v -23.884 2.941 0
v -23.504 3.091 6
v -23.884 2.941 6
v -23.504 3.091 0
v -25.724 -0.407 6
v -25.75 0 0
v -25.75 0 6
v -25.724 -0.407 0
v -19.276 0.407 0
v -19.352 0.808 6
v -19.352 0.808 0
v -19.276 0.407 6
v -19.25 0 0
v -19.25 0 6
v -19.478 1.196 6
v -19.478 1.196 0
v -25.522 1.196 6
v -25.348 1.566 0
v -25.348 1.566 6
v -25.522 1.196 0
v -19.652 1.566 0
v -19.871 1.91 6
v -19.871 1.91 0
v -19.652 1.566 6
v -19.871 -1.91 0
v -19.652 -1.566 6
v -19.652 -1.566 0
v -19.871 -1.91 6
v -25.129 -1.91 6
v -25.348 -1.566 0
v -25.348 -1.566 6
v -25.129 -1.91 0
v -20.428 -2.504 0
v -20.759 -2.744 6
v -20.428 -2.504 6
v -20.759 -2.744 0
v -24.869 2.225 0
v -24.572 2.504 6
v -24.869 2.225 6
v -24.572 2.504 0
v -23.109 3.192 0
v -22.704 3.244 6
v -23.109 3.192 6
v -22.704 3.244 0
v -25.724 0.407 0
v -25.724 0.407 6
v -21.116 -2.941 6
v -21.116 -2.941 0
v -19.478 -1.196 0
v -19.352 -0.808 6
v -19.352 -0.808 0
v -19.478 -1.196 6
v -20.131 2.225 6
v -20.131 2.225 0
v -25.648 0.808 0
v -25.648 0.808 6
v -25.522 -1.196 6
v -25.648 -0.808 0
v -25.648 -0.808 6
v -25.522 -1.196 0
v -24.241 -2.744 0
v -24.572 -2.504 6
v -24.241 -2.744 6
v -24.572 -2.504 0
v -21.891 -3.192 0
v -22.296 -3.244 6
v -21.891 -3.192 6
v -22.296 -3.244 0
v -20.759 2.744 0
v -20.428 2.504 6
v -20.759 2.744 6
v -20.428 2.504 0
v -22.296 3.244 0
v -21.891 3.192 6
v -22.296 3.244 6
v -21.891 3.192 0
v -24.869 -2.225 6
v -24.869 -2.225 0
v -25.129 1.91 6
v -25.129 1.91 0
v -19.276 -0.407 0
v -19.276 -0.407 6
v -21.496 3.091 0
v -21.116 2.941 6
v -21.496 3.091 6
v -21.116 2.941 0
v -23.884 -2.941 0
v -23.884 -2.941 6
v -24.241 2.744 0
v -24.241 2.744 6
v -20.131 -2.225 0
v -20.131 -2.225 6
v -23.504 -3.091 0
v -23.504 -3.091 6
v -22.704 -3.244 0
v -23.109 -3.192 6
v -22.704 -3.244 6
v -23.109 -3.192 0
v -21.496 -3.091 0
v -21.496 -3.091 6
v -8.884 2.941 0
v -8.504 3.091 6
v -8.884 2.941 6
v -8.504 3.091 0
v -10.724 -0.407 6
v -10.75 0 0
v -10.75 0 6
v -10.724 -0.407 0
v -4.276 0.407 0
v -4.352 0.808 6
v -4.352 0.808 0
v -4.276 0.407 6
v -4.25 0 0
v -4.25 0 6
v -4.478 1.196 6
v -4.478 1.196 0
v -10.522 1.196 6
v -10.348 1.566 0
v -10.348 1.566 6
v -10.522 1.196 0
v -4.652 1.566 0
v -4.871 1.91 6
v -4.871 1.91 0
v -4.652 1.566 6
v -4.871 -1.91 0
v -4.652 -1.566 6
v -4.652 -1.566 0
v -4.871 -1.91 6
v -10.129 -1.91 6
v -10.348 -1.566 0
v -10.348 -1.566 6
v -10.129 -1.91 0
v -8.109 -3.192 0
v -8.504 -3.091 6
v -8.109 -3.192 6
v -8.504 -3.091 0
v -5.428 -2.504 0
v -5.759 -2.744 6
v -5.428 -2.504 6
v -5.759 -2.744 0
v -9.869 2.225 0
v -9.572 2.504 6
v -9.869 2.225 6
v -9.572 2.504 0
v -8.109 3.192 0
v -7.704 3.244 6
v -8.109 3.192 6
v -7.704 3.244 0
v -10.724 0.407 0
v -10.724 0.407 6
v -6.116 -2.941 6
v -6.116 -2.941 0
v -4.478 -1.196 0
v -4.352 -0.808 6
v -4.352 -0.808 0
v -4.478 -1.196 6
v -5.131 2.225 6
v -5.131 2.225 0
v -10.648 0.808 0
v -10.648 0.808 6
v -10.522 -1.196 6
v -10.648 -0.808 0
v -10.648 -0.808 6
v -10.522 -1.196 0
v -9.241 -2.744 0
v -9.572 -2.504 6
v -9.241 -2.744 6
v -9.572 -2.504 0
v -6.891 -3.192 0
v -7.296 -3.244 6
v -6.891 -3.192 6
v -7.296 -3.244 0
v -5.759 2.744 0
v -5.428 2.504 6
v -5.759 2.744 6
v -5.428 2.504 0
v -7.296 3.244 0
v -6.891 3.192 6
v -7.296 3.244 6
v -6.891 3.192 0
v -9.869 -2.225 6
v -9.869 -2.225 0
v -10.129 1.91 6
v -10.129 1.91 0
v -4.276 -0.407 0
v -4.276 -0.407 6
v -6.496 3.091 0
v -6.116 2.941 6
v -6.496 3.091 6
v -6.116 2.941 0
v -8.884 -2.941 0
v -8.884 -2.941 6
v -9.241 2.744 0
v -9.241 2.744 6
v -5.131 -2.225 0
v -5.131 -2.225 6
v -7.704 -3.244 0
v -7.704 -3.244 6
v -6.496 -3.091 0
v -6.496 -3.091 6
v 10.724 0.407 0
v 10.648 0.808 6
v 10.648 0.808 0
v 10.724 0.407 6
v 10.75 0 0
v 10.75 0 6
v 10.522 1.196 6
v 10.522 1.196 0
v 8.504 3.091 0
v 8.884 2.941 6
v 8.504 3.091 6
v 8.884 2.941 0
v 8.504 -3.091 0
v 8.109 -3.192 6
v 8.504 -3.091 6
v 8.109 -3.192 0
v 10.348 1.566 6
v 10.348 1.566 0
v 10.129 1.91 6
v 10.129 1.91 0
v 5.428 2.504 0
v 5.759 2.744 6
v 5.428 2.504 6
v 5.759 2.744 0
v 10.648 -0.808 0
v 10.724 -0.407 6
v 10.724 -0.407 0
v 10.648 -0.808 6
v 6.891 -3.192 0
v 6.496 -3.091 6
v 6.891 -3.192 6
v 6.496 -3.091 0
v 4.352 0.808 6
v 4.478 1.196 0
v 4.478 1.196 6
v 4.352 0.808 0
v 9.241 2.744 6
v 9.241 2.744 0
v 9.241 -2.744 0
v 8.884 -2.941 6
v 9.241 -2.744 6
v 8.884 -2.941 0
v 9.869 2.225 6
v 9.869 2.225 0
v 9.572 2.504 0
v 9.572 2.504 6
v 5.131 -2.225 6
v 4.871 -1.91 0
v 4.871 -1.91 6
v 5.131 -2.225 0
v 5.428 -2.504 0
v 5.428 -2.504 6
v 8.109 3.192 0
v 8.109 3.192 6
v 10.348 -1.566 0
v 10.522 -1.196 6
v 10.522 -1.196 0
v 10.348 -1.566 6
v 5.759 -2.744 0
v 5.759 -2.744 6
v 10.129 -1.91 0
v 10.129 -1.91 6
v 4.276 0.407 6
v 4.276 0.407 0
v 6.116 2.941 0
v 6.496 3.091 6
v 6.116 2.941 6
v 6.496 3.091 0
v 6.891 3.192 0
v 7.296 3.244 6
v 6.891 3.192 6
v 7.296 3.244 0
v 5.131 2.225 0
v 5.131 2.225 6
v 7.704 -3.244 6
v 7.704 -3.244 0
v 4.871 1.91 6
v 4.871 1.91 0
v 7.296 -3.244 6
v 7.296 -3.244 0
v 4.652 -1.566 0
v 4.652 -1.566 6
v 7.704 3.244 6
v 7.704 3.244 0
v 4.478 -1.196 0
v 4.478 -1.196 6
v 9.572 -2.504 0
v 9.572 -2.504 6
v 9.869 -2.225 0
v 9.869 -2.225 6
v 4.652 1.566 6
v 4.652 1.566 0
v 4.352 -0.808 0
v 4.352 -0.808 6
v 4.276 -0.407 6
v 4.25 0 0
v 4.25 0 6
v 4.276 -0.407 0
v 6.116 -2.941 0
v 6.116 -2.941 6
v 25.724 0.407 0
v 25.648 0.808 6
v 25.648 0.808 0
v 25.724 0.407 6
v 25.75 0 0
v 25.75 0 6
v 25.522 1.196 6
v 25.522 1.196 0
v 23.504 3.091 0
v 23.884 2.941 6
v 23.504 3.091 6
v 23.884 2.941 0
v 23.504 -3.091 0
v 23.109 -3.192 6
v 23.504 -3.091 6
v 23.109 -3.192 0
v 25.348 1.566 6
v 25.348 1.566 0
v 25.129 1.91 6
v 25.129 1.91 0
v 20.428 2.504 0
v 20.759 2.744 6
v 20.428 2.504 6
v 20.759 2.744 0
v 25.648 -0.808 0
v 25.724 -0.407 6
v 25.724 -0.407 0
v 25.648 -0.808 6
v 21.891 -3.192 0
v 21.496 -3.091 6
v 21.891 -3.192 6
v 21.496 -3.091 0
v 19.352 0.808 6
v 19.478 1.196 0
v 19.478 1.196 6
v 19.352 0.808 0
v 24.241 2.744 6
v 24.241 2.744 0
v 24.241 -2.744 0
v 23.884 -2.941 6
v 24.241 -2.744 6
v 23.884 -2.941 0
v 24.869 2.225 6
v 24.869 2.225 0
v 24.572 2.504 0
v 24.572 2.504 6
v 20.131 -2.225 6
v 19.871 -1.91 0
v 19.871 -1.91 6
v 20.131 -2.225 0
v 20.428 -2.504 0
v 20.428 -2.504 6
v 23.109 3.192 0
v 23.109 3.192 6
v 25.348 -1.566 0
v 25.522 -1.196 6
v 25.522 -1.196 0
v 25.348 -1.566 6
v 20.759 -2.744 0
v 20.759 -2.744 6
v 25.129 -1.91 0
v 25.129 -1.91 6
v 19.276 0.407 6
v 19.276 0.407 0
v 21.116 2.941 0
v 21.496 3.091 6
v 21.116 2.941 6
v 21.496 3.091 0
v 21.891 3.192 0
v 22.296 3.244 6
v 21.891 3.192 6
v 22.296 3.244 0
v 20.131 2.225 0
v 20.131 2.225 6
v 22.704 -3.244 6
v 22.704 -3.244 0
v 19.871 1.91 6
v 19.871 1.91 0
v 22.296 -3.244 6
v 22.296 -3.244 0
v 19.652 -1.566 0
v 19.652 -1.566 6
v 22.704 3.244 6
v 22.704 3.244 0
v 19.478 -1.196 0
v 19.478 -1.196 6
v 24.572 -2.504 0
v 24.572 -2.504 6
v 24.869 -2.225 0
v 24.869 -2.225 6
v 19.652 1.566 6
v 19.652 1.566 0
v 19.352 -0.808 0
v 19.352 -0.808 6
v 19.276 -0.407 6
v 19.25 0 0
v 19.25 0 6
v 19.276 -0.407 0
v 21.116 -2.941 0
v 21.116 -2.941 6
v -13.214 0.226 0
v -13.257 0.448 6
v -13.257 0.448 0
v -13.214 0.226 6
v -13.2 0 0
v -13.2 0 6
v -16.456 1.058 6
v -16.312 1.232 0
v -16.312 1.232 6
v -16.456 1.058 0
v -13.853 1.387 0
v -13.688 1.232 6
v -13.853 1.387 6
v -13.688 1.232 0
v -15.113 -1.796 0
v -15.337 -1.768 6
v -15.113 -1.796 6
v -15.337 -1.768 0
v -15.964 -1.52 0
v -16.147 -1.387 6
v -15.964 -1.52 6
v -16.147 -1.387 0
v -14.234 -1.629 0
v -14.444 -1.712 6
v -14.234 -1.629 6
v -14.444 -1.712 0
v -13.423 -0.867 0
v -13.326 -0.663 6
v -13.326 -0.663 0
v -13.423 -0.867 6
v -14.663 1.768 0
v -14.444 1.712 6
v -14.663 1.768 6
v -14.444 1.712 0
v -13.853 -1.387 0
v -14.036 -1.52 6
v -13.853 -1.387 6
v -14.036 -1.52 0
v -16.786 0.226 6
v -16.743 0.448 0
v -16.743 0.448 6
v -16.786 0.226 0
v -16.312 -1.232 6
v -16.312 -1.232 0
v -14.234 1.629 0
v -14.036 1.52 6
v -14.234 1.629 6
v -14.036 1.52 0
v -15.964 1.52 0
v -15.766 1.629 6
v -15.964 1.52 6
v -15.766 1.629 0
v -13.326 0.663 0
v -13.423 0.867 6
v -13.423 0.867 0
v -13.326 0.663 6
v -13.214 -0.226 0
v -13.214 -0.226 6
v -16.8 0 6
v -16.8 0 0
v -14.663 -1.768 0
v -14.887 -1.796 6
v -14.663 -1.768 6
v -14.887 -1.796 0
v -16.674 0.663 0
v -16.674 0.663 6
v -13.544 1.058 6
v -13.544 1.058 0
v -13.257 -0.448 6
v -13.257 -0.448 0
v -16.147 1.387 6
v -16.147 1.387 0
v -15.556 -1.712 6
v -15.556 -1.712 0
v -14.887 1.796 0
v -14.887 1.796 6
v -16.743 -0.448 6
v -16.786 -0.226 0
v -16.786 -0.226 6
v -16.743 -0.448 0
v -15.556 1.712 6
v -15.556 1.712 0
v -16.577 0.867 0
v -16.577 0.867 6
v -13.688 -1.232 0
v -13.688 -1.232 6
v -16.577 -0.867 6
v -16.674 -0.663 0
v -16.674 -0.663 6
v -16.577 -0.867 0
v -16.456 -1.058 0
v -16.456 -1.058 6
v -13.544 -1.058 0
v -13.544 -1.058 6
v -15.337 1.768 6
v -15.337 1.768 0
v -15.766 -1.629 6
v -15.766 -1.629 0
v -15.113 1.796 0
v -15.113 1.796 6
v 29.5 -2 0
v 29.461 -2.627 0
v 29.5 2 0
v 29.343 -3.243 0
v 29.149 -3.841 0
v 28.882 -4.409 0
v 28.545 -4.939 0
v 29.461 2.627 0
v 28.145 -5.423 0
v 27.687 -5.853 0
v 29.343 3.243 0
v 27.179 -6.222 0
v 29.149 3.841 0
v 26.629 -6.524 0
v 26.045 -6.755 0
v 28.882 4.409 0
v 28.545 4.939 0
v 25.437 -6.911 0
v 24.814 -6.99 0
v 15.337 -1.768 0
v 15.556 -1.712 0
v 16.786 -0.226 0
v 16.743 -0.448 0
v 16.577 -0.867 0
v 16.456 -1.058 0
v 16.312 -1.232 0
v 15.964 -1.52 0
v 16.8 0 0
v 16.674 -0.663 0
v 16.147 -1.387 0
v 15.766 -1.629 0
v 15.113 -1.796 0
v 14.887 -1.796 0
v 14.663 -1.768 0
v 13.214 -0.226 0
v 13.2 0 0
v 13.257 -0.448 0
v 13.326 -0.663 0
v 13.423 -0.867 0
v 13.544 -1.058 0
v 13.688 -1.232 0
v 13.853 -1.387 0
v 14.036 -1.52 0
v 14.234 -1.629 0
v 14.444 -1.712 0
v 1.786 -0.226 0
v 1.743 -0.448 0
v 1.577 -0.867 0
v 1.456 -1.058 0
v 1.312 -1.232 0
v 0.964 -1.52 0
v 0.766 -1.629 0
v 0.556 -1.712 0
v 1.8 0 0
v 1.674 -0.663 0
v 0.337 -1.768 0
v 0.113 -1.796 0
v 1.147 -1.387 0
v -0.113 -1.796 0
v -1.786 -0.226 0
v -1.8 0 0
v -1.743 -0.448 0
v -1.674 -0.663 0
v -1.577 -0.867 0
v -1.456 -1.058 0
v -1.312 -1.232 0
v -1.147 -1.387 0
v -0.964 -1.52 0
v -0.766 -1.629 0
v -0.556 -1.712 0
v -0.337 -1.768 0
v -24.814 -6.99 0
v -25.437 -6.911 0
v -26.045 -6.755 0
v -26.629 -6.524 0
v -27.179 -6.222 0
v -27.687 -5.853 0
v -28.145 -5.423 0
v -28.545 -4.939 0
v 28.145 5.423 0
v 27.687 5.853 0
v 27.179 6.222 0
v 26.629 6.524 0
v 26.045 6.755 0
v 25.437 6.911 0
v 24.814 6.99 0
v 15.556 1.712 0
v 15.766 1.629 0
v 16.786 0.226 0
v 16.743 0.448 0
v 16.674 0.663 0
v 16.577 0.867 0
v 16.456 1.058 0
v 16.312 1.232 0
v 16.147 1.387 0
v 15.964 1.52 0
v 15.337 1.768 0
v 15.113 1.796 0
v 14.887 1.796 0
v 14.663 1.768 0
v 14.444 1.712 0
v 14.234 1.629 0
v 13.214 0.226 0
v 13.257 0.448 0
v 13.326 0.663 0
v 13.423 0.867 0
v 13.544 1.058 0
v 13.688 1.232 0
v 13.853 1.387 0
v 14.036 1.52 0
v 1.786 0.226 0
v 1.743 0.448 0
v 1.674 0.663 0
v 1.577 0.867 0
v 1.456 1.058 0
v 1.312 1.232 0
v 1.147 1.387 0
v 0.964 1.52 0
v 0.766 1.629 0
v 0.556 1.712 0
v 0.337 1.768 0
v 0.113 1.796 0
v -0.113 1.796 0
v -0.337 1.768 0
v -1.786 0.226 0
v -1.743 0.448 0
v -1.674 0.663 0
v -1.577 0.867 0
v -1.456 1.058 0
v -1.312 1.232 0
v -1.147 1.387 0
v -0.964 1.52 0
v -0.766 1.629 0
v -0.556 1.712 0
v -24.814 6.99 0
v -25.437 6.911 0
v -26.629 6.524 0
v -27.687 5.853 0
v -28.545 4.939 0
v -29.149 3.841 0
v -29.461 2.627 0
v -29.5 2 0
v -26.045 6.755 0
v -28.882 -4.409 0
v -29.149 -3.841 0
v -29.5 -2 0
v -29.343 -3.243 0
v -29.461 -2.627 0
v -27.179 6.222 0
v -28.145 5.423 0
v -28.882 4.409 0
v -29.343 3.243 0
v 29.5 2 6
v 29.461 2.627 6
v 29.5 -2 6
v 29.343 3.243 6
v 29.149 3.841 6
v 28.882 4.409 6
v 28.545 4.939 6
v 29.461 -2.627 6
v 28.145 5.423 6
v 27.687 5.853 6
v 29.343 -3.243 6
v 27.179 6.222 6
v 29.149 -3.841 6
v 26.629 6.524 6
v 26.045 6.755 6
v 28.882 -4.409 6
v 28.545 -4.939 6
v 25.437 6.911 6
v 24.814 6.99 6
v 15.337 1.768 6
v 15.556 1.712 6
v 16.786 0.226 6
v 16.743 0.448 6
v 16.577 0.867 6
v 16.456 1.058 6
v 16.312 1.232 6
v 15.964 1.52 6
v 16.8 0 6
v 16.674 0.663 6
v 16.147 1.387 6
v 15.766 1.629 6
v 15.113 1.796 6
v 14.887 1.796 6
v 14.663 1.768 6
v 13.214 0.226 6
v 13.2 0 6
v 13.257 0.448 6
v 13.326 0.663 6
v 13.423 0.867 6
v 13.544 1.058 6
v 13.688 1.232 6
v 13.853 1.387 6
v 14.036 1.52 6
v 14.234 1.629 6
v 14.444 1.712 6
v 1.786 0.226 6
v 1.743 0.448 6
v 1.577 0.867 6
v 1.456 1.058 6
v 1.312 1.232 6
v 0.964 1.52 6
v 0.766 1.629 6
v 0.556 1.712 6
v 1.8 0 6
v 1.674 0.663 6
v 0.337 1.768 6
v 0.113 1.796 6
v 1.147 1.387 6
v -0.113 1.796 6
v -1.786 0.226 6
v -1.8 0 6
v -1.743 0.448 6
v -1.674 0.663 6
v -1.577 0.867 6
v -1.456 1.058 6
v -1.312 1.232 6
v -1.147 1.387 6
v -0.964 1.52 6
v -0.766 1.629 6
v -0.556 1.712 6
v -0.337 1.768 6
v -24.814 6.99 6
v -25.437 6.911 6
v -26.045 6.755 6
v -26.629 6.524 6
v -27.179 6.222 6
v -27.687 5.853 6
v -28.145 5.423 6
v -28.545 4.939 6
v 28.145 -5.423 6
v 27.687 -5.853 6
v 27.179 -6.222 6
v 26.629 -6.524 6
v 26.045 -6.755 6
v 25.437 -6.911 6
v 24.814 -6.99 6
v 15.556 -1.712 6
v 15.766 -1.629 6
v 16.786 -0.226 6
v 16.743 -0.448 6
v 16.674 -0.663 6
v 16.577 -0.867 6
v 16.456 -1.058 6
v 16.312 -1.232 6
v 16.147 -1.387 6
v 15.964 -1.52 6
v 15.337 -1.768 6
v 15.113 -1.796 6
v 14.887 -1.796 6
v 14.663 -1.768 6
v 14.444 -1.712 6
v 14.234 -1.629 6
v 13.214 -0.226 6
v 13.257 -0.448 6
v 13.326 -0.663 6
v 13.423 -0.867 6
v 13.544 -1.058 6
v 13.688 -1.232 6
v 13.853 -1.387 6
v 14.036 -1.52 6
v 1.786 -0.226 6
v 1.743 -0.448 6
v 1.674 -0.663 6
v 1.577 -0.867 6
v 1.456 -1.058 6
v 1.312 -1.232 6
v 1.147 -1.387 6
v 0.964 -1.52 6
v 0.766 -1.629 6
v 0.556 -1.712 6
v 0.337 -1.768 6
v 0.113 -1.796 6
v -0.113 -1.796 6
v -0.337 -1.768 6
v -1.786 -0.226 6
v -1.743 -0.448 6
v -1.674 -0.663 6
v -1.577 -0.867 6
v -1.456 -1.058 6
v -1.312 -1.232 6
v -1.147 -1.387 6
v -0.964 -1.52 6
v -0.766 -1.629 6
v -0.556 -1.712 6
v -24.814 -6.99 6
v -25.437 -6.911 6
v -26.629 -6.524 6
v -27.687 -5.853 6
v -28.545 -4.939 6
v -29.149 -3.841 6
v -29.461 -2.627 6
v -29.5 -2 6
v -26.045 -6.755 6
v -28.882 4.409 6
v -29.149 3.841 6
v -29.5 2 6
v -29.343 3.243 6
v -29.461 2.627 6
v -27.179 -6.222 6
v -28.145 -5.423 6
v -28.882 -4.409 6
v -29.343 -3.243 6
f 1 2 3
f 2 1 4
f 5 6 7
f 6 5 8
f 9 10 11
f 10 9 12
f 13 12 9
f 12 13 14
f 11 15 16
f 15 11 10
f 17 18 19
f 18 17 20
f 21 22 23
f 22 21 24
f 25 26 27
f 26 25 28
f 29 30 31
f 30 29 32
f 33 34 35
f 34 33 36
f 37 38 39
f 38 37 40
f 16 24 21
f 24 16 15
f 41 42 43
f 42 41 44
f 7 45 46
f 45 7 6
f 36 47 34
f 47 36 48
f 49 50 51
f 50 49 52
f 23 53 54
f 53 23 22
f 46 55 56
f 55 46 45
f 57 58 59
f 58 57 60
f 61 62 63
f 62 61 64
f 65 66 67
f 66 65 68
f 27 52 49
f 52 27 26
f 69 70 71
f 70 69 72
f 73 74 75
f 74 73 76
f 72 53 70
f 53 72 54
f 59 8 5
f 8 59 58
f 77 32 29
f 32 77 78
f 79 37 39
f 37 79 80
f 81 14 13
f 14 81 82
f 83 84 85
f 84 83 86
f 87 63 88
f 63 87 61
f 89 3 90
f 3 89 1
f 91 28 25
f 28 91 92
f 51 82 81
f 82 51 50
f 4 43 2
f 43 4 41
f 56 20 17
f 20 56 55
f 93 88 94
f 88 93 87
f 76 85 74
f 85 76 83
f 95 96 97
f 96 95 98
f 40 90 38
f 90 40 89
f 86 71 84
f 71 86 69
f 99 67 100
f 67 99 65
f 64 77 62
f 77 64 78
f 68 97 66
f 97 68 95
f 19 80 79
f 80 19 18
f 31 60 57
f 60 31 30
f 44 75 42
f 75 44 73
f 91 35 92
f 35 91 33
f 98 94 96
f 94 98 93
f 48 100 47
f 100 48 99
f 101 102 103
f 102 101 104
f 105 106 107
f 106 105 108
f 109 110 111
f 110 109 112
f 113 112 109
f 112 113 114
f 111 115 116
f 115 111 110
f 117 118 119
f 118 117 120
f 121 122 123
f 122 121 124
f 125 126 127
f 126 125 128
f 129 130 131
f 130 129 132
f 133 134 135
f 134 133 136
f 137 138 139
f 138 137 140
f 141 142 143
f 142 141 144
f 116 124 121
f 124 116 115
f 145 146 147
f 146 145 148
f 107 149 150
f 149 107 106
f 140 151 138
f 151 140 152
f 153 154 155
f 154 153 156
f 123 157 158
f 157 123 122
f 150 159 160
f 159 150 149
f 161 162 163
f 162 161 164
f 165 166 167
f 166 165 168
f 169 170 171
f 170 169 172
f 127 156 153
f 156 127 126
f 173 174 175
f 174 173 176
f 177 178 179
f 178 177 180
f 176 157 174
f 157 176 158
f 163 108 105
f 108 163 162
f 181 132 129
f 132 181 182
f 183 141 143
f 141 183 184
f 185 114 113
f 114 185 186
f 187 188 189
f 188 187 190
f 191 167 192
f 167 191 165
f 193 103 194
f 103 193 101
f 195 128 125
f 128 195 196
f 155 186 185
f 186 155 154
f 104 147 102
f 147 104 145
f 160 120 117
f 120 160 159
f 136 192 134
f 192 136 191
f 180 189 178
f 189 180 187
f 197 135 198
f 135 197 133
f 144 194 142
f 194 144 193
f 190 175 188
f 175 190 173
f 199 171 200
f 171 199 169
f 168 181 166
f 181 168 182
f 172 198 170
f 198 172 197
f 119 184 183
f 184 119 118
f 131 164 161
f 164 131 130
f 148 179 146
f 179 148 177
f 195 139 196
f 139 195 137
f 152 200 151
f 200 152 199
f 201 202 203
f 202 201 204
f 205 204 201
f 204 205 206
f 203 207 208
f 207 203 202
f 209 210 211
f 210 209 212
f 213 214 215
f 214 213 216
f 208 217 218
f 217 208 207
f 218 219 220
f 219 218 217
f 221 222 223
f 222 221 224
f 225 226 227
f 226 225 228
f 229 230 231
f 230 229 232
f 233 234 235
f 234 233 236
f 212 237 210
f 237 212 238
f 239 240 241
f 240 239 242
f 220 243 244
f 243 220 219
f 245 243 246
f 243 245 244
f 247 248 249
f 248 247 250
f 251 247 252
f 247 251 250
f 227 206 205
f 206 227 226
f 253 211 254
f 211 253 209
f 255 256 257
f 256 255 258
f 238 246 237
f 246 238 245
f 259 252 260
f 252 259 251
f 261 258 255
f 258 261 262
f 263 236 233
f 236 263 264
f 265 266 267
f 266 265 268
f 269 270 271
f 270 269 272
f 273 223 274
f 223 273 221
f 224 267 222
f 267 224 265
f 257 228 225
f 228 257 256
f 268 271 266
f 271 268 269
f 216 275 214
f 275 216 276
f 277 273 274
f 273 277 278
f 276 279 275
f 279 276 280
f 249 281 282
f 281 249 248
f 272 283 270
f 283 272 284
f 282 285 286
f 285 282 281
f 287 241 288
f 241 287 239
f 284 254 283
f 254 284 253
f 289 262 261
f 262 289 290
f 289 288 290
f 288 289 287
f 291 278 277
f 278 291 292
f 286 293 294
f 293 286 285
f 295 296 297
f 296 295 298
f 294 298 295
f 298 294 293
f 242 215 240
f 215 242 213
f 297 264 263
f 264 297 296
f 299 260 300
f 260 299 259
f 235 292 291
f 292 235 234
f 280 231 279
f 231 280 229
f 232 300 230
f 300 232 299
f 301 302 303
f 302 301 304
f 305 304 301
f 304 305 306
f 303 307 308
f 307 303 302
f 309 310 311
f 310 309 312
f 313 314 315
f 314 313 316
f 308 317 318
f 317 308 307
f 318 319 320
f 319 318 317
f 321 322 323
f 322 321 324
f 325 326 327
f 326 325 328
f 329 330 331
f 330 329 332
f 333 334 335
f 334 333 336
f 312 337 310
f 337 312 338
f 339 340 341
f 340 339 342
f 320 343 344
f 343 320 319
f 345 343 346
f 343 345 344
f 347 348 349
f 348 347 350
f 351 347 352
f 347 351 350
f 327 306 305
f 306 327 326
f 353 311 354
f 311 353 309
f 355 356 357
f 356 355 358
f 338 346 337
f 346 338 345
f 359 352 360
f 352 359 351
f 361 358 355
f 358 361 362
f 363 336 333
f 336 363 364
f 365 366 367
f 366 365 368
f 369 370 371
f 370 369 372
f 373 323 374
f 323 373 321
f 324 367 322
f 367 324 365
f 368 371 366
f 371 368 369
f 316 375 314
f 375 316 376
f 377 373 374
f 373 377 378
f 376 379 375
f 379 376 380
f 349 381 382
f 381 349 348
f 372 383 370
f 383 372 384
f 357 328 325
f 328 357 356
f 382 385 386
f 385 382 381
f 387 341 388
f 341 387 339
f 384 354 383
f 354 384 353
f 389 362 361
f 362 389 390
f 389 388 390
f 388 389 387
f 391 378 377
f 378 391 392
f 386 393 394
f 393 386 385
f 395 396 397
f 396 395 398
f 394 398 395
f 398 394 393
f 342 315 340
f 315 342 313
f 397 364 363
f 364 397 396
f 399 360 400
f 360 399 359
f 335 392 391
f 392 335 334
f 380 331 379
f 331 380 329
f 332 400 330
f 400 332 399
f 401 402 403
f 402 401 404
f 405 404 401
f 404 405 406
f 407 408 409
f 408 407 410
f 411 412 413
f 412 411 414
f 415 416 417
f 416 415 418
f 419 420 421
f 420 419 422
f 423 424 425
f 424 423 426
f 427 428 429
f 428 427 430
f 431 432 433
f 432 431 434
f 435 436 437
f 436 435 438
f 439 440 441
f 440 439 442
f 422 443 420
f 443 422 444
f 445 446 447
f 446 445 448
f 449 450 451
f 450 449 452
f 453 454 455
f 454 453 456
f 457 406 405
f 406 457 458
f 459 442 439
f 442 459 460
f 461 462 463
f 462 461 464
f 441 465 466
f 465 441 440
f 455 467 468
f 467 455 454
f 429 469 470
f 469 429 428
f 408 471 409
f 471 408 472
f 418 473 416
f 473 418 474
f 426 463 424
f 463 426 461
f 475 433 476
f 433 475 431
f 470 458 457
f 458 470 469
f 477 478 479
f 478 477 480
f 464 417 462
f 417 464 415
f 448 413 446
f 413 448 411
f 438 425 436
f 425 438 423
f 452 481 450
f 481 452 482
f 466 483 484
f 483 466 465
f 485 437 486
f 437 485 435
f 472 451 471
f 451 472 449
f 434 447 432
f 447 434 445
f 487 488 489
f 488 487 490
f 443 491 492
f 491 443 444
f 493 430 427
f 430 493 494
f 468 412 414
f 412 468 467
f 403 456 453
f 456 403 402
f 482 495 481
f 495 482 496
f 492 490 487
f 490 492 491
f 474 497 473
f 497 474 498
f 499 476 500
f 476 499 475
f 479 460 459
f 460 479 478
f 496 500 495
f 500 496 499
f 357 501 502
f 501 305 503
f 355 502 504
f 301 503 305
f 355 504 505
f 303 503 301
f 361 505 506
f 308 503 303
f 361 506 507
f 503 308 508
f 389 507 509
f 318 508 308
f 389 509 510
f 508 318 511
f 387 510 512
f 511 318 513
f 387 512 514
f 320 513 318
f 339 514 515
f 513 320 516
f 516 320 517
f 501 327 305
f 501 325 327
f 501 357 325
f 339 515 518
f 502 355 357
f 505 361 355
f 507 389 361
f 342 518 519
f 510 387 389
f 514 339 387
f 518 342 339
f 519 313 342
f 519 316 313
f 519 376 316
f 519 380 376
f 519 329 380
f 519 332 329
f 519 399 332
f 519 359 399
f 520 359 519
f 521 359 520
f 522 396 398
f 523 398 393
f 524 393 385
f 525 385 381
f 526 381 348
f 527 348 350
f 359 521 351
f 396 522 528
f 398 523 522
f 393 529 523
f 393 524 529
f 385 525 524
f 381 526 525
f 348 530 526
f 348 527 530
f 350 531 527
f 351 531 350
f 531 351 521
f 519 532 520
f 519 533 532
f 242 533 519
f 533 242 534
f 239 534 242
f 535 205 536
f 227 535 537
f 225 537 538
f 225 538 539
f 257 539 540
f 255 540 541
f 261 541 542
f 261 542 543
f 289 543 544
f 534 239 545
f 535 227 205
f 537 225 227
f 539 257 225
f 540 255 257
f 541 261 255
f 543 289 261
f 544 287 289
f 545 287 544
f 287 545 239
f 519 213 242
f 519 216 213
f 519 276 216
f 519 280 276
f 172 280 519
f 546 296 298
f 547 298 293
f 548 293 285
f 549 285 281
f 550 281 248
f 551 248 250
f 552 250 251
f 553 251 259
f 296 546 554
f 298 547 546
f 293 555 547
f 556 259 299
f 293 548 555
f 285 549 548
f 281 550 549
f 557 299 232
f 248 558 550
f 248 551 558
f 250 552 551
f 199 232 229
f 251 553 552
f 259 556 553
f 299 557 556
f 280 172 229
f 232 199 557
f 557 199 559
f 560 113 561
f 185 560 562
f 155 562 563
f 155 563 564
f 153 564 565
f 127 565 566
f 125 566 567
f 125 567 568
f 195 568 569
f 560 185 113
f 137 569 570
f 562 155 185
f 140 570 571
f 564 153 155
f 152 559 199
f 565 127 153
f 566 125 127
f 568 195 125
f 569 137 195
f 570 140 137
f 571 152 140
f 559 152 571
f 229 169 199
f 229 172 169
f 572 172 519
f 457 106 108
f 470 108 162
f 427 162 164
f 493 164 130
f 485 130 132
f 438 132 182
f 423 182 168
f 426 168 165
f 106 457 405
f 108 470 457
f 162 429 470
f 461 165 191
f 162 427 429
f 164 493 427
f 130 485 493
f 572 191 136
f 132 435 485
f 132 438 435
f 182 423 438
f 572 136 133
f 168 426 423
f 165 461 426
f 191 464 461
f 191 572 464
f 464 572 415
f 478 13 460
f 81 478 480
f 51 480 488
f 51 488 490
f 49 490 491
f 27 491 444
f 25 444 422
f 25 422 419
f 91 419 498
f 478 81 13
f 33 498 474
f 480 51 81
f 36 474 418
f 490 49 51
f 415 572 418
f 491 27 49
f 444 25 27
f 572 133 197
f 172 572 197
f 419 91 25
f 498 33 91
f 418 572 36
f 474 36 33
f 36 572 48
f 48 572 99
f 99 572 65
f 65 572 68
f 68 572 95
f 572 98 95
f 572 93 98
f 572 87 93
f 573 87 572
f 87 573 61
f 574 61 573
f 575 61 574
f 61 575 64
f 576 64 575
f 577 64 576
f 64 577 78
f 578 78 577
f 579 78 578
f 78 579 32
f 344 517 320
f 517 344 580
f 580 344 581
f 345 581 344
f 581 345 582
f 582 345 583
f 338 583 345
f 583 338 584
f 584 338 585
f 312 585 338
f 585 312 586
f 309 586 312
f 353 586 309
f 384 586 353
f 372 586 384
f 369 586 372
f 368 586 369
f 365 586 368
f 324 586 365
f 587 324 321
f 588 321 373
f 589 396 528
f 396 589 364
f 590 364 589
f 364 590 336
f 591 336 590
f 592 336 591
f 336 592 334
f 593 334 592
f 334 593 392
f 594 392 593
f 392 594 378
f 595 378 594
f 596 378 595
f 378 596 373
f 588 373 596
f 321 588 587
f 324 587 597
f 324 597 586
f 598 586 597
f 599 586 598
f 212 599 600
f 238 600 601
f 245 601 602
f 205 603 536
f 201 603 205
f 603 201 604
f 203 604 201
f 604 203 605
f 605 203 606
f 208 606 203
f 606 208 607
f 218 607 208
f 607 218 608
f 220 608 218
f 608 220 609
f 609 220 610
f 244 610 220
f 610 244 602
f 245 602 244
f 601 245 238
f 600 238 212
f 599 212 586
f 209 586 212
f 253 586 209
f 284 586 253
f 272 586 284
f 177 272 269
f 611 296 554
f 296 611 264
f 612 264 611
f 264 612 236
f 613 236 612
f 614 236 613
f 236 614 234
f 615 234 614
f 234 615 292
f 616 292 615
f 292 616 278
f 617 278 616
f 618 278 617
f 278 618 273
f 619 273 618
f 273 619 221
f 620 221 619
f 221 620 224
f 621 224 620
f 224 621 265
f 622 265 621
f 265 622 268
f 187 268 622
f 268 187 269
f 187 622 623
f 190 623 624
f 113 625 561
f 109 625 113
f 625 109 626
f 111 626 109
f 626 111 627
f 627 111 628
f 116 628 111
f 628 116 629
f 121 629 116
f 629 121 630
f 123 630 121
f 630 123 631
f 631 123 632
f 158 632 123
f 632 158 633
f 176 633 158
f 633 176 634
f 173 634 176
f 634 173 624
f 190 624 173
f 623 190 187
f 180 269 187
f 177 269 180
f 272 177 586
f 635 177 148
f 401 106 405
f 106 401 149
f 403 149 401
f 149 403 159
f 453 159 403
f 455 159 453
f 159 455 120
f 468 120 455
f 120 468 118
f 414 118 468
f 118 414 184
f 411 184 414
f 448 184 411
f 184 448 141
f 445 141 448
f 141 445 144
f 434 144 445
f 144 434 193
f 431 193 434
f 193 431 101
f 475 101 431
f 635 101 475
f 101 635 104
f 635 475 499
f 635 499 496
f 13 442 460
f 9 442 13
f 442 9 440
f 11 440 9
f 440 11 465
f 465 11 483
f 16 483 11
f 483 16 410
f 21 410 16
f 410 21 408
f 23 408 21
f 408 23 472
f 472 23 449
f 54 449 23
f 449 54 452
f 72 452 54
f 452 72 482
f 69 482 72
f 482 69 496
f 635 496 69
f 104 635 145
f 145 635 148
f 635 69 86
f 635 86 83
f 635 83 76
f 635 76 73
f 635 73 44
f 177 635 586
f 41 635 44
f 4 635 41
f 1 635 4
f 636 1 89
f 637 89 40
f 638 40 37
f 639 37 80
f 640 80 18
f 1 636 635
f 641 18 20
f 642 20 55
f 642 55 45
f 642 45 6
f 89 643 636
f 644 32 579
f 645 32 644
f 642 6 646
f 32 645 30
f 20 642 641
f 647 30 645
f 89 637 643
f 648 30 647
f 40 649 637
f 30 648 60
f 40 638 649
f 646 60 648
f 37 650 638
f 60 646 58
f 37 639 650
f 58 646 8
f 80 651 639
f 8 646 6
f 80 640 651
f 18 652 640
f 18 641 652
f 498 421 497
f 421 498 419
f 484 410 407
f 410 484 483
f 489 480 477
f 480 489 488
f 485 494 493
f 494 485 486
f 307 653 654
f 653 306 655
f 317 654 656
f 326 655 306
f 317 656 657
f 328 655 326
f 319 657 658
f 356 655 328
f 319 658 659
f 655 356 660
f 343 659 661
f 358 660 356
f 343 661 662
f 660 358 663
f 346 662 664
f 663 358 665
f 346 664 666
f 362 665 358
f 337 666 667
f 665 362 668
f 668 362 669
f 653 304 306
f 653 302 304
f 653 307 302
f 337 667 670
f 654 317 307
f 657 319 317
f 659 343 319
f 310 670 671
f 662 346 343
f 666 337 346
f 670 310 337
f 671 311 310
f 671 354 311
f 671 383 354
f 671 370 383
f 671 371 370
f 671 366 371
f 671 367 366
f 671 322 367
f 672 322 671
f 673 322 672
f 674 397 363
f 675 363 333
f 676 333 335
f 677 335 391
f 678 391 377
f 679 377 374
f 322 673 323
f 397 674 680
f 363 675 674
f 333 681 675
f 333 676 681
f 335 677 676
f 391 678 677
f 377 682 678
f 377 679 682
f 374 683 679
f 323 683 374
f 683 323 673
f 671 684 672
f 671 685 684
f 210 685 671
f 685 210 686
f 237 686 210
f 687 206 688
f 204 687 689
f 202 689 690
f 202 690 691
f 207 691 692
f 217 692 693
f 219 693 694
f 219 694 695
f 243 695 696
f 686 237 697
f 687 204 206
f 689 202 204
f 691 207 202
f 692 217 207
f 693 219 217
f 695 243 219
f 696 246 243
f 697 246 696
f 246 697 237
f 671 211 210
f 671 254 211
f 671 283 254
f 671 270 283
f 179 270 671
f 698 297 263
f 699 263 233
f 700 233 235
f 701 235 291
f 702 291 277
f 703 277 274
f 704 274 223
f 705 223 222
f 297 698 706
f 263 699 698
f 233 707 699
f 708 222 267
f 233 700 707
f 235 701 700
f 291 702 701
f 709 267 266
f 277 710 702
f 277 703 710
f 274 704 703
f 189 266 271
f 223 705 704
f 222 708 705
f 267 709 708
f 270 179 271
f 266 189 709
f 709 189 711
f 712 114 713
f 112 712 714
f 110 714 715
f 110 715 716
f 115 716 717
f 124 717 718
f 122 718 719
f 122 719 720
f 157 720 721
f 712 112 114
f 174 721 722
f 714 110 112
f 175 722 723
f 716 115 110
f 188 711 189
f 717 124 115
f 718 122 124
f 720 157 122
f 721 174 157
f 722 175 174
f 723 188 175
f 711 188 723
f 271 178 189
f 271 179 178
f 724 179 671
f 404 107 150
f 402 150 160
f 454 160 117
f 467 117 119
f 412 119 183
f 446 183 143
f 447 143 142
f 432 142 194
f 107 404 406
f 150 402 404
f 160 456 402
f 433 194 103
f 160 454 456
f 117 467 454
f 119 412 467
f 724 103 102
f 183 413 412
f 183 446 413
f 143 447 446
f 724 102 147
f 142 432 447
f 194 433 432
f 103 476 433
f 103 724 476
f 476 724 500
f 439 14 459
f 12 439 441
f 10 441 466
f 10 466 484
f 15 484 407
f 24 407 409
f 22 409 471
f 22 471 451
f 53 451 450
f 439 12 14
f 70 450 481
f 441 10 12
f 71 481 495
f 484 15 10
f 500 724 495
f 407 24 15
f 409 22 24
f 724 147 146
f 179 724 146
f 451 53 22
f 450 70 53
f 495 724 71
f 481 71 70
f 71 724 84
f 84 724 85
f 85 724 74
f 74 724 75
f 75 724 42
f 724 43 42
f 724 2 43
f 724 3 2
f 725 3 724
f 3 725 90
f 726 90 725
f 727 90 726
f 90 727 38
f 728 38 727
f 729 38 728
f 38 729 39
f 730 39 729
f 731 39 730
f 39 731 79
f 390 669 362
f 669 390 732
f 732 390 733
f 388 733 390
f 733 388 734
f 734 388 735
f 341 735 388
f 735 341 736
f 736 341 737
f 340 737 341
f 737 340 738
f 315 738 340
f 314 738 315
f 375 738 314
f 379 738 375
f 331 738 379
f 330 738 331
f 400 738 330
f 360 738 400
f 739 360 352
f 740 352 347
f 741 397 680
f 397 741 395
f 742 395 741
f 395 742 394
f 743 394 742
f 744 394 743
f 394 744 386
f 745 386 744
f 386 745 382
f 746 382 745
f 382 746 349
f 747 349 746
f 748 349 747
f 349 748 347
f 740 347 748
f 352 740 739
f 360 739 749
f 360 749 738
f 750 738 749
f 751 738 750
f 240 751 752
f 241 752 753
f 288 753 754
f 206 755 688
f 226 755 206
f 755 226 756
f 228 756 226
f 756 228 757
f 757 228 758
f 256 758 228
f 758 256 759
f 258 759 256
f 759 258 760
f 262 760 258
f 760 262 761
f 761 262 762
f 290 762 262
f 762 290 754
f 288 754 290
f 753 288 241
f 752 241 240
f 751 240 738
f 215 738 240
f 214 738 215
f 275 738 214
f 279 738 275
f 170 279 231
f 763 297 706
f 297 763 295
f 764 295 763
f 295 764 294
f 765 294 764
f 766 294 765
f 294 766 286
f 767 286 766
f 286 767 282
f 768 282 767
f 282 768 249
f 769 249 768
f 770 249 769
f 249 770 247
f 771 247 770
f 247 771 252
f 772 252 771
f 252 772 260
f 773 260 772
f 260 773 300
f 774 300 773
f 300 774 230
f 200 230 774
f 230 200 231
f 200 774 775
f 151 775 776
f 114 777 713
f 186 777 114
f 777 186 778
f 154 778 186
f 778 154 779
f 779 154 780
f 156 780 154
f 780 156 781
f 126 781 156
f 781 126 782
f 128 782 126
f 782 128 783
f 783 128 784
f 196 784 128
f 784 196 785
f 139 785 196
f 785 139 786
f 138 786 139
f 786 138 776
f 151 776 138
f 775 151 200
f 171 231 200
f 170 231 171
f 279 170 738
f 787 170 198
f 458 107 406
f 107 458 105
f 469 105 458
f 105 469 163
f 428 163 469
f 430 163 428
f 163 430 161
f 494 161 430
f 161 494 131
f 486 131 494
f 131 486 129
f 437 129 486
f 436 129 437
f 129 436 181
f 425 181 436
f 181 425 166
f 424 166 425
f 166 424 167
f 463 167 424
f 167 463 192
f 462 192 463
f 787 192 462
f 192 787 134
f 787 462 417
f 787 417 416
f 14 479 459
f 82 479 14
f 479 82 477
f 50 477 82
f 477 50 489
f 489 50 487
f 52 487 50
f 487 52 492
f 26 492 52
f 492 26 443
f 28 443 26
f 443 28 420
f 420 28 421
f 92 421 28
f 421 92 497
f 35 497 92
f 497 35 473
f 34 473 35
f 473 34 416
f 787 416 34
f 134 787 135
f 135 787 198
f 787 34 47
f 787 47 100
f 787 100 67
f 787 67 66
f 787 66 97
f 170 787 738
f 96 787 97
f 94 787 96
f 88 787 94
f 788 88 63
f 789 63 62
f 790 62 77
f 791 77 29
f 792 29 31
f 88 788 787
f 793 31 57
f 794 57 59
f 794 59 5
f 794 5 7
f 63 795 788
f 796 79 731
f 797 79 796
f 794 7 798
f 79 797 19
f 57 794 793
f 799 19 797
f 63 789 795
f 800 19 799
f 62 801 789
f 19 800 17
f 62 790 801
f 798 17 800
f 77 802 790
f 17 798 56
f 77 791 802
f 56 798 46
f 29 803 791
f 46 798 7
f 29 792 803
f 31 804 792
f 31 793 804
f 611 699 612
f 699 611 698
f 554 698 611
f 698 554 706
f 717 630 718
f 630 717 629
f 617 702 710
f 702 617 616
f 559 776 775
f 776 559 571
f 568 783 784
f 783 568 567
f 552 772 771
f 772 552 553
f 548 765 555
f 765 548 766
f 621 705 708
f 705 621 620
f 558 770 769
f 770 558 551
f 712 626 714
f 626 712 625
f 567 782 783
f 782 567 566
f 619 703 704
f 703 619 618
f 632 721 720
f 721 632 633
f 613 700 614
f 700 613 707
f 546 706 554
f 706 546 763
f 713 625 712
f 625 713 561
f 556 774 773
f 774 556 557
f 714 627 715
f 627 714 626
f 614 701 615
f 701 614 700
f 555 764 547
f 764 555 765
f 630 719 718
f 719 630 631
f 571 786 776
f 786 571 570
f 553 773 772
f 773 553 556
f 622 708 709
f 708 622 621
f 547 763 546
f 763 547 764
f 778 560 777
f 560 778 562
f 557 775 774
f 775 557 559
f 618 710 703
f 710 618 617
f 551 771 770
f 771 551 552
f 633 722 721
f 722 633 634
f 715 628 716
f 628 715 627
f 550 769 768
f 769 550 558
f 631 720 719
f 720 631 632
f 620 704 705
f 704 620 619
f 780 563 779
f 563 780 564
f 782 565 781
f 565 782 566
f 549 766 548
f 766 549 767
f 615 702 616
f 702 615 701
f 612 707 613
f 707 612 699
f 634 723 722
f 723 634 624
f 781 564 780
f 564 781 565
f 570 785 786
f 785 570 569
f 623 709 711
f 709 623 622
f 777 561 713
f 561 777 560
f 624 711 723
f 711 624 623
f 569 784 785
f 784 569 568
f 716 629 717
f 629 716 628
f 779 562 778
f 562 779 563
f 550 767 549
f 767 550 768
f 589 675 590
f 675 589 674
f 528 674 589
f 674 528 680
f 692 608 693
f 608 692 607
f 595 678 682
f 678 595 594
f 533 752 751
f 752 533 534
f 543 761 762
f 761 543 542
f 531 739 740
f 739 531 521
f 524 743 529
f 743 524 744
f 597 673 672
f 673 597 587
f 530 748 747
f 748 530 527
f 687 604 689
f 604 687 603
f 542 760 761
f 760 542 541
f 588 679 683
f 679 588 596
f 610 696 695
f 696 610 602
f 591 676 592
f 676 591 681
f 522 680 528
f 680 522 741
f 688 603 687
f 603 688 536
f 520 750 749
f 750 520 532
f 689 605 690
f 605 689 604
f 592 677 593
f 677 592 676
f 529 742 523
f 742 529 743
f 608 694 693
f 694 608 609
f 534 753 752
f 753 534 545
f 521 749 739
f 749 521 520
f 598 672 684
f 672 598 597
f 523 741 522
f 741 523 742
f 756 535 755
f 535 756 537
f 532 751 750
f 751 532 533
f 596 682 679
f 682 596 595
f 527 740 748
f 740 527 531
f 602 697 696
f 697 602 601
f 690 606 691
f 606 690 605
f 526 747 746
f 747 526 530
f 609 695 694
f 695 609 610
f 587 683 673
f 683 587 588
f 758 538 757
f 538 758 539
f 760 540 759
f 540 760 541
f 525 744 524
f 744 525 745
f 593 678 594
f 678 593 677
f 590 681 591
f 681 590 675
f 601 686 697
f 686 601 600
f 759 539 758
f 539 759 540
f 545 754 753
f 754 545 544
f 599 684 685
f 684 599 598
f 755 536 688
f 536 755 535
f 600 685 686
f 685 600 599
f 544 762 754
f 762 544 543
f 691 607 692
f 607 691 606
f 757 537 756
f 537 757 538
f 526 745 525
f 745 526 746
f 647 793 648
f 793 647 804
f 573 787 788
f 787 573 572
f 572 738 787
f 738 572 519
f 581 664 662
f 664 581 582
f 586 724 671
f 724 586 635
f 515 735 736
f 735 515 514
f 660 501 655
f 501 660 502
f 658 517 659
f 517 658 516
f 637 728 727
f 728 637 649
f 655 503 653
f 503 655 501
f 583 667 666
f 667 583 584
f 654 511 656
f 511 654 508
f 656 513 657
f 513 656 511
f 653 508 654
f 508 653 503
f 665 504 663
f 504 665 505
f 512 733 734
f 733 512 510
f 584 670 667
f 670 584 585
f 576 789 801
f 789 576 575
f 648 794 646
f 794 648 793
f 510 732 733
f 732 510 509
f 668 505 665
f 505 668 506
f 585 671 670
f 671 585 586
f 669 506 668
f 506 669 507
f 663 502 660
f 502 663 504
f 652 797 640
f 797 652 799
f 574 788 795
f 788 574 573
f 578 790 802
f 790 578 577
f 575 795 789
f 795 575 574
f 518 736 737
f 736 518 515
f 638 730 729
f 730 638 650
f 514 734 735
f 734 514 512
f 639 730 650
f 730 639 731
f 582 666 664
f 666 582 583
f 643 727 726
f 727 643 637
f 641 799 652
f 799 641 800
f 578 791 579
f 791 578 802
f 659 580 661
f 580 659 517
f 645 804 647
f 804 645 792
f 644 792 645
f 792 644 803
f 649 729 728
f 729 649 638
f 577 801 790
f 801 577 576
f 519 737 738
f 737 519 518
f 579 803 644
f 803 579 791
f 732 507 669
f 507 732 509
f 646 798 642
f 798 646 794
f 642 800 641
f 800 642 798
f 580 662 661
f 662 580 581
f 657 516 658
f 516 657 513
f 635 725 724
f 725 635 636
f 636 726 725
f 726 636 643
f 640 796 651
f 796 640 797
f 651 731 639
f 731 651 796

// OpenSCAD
$fn = 50;


difference() {
	union() {
		hull() {
			translate(v = [-24.5000000000, 2.0000000000, 0]) {
				cylinder(h = 6, r = 5);
			}
			translate(v = [24.5000000000, 2.0000000000, 0]) {
				cylinder(h = 6, r = 5);
			}
			translate(v = [-24.5000000000, -2.0000000000, 0]) {
				cylinder(h = 6, r = 5);
			}
			translate(v = [24.5000000000, -2.0000000000, 0]) {
				cylinder(h = 6, r = 5);
			}
		}
	}
	union() {
		translate(v = [-22.5000000000, 0.0000000000, -100.0000000000]) {
			cylinder(h = 200, r = 3.2500000000);
		}
		translate(v = [-7.5000000000, 0.0000000000, -100.0000000000]) {
			cylinder(h = 200, r = 3.2500000000);
		}
		translate(v = [7.5000000000, 0.0000000000, -100.0000000000]) {
			cylinder(h = 200, r = 3.2500000000);
		}
		translate(v = [22.5000000000, 0.0000000000, -100.0000000000]) {
			cylinder(h = 200, r = 3.2500000000);
		}
		translate(v = [-22.5000000000, 0.0000000000, 0]) {
			cylinder(h = 6, r = 1.8000000000);
		}
		translate(v = [-15.0000000000, 0.0000000000, 0]) {
			cylinder(h = 6, r = 1.8000000000);
		}
		translate(v = [-7.5000000000, 0.0000000000, 0]) {
			cylinder(h = 6, r = 1.8000000000);
		}
		cylinder(h = 6, r = 1.8000000000);
		translate(v = [7.5000000000, 0.0000000000, 0]) {
			cylinder(h = 6, r = 1.8000000000);
		}
		translate(v = [15.0000000000, 0.0000000000, 0]) {
			cylinder(h = 6, r = 1.8000000000);
		}
		translate(v = [22.5000000000, 0.0000000000, 0]) {
			cylinder(h = 6, r = 1.8000000000);
		}
		translate(v = [-22.5000000000, 0.0000000000, 0]) {
			cylinder(h = 6, r = 1.8000000000);
		}
		translate(v = [-15.0000000000, 0.0000000000, 0]) {
			cylinder(h = 6, r = 1.8000000000);
		}
		translate(v = [-7.5000000000, 0.0000000000, 0]) {
			cylinder(h = 6, r = 1.8000000000);
		}
		cylinder(h = 6, r = 1.8000000000);
		translate(v = [7.5000000000, 0.0000000000, 0]) {
			cylinder(h = 6, r = 1.8000000000);
		}
		translate(v = [15.0000000000, 0.0000000000, 0]) {
			cylinder(h = 6, r = 1.8000000000);
		}
		translate(v = [22.5000000000, 0.0000000000, 0]) {
			cylinder(h = 6, r = 1.8000000000);
		}
		translate(v = [-22.5000000000, 0.0000000000, 0]) {
			cylinder(h = 6, r = 1.8000000000);
		}
		translate(v = [-15.0000000000, 0.0000000000, 0]) {
			cylinder(h = 6, r = 1.8000000000);
		}
		translate(v = [-7.5000000000, 0.0000000000, 0]) {
			cylinder(h = 6, r = 1.8000000000);
		}
		cylinder(h = 6, r = 1.8000000000);
		translate(v = [7.5000000000, 0.0000000000, 0]) {
			cylinder(h = 6, r = 1.8000000000);
		}
		translate(v = [15.0000000000, 0.0000000000, 0]) {
			cylinder(h = 6, r = 1.8000000000);
		}
		translate(v = [22.5000000000, 0.0000000000, 0]) {
			cylinder(h = 6, r = 1.8000000000);
		}
	}
}
